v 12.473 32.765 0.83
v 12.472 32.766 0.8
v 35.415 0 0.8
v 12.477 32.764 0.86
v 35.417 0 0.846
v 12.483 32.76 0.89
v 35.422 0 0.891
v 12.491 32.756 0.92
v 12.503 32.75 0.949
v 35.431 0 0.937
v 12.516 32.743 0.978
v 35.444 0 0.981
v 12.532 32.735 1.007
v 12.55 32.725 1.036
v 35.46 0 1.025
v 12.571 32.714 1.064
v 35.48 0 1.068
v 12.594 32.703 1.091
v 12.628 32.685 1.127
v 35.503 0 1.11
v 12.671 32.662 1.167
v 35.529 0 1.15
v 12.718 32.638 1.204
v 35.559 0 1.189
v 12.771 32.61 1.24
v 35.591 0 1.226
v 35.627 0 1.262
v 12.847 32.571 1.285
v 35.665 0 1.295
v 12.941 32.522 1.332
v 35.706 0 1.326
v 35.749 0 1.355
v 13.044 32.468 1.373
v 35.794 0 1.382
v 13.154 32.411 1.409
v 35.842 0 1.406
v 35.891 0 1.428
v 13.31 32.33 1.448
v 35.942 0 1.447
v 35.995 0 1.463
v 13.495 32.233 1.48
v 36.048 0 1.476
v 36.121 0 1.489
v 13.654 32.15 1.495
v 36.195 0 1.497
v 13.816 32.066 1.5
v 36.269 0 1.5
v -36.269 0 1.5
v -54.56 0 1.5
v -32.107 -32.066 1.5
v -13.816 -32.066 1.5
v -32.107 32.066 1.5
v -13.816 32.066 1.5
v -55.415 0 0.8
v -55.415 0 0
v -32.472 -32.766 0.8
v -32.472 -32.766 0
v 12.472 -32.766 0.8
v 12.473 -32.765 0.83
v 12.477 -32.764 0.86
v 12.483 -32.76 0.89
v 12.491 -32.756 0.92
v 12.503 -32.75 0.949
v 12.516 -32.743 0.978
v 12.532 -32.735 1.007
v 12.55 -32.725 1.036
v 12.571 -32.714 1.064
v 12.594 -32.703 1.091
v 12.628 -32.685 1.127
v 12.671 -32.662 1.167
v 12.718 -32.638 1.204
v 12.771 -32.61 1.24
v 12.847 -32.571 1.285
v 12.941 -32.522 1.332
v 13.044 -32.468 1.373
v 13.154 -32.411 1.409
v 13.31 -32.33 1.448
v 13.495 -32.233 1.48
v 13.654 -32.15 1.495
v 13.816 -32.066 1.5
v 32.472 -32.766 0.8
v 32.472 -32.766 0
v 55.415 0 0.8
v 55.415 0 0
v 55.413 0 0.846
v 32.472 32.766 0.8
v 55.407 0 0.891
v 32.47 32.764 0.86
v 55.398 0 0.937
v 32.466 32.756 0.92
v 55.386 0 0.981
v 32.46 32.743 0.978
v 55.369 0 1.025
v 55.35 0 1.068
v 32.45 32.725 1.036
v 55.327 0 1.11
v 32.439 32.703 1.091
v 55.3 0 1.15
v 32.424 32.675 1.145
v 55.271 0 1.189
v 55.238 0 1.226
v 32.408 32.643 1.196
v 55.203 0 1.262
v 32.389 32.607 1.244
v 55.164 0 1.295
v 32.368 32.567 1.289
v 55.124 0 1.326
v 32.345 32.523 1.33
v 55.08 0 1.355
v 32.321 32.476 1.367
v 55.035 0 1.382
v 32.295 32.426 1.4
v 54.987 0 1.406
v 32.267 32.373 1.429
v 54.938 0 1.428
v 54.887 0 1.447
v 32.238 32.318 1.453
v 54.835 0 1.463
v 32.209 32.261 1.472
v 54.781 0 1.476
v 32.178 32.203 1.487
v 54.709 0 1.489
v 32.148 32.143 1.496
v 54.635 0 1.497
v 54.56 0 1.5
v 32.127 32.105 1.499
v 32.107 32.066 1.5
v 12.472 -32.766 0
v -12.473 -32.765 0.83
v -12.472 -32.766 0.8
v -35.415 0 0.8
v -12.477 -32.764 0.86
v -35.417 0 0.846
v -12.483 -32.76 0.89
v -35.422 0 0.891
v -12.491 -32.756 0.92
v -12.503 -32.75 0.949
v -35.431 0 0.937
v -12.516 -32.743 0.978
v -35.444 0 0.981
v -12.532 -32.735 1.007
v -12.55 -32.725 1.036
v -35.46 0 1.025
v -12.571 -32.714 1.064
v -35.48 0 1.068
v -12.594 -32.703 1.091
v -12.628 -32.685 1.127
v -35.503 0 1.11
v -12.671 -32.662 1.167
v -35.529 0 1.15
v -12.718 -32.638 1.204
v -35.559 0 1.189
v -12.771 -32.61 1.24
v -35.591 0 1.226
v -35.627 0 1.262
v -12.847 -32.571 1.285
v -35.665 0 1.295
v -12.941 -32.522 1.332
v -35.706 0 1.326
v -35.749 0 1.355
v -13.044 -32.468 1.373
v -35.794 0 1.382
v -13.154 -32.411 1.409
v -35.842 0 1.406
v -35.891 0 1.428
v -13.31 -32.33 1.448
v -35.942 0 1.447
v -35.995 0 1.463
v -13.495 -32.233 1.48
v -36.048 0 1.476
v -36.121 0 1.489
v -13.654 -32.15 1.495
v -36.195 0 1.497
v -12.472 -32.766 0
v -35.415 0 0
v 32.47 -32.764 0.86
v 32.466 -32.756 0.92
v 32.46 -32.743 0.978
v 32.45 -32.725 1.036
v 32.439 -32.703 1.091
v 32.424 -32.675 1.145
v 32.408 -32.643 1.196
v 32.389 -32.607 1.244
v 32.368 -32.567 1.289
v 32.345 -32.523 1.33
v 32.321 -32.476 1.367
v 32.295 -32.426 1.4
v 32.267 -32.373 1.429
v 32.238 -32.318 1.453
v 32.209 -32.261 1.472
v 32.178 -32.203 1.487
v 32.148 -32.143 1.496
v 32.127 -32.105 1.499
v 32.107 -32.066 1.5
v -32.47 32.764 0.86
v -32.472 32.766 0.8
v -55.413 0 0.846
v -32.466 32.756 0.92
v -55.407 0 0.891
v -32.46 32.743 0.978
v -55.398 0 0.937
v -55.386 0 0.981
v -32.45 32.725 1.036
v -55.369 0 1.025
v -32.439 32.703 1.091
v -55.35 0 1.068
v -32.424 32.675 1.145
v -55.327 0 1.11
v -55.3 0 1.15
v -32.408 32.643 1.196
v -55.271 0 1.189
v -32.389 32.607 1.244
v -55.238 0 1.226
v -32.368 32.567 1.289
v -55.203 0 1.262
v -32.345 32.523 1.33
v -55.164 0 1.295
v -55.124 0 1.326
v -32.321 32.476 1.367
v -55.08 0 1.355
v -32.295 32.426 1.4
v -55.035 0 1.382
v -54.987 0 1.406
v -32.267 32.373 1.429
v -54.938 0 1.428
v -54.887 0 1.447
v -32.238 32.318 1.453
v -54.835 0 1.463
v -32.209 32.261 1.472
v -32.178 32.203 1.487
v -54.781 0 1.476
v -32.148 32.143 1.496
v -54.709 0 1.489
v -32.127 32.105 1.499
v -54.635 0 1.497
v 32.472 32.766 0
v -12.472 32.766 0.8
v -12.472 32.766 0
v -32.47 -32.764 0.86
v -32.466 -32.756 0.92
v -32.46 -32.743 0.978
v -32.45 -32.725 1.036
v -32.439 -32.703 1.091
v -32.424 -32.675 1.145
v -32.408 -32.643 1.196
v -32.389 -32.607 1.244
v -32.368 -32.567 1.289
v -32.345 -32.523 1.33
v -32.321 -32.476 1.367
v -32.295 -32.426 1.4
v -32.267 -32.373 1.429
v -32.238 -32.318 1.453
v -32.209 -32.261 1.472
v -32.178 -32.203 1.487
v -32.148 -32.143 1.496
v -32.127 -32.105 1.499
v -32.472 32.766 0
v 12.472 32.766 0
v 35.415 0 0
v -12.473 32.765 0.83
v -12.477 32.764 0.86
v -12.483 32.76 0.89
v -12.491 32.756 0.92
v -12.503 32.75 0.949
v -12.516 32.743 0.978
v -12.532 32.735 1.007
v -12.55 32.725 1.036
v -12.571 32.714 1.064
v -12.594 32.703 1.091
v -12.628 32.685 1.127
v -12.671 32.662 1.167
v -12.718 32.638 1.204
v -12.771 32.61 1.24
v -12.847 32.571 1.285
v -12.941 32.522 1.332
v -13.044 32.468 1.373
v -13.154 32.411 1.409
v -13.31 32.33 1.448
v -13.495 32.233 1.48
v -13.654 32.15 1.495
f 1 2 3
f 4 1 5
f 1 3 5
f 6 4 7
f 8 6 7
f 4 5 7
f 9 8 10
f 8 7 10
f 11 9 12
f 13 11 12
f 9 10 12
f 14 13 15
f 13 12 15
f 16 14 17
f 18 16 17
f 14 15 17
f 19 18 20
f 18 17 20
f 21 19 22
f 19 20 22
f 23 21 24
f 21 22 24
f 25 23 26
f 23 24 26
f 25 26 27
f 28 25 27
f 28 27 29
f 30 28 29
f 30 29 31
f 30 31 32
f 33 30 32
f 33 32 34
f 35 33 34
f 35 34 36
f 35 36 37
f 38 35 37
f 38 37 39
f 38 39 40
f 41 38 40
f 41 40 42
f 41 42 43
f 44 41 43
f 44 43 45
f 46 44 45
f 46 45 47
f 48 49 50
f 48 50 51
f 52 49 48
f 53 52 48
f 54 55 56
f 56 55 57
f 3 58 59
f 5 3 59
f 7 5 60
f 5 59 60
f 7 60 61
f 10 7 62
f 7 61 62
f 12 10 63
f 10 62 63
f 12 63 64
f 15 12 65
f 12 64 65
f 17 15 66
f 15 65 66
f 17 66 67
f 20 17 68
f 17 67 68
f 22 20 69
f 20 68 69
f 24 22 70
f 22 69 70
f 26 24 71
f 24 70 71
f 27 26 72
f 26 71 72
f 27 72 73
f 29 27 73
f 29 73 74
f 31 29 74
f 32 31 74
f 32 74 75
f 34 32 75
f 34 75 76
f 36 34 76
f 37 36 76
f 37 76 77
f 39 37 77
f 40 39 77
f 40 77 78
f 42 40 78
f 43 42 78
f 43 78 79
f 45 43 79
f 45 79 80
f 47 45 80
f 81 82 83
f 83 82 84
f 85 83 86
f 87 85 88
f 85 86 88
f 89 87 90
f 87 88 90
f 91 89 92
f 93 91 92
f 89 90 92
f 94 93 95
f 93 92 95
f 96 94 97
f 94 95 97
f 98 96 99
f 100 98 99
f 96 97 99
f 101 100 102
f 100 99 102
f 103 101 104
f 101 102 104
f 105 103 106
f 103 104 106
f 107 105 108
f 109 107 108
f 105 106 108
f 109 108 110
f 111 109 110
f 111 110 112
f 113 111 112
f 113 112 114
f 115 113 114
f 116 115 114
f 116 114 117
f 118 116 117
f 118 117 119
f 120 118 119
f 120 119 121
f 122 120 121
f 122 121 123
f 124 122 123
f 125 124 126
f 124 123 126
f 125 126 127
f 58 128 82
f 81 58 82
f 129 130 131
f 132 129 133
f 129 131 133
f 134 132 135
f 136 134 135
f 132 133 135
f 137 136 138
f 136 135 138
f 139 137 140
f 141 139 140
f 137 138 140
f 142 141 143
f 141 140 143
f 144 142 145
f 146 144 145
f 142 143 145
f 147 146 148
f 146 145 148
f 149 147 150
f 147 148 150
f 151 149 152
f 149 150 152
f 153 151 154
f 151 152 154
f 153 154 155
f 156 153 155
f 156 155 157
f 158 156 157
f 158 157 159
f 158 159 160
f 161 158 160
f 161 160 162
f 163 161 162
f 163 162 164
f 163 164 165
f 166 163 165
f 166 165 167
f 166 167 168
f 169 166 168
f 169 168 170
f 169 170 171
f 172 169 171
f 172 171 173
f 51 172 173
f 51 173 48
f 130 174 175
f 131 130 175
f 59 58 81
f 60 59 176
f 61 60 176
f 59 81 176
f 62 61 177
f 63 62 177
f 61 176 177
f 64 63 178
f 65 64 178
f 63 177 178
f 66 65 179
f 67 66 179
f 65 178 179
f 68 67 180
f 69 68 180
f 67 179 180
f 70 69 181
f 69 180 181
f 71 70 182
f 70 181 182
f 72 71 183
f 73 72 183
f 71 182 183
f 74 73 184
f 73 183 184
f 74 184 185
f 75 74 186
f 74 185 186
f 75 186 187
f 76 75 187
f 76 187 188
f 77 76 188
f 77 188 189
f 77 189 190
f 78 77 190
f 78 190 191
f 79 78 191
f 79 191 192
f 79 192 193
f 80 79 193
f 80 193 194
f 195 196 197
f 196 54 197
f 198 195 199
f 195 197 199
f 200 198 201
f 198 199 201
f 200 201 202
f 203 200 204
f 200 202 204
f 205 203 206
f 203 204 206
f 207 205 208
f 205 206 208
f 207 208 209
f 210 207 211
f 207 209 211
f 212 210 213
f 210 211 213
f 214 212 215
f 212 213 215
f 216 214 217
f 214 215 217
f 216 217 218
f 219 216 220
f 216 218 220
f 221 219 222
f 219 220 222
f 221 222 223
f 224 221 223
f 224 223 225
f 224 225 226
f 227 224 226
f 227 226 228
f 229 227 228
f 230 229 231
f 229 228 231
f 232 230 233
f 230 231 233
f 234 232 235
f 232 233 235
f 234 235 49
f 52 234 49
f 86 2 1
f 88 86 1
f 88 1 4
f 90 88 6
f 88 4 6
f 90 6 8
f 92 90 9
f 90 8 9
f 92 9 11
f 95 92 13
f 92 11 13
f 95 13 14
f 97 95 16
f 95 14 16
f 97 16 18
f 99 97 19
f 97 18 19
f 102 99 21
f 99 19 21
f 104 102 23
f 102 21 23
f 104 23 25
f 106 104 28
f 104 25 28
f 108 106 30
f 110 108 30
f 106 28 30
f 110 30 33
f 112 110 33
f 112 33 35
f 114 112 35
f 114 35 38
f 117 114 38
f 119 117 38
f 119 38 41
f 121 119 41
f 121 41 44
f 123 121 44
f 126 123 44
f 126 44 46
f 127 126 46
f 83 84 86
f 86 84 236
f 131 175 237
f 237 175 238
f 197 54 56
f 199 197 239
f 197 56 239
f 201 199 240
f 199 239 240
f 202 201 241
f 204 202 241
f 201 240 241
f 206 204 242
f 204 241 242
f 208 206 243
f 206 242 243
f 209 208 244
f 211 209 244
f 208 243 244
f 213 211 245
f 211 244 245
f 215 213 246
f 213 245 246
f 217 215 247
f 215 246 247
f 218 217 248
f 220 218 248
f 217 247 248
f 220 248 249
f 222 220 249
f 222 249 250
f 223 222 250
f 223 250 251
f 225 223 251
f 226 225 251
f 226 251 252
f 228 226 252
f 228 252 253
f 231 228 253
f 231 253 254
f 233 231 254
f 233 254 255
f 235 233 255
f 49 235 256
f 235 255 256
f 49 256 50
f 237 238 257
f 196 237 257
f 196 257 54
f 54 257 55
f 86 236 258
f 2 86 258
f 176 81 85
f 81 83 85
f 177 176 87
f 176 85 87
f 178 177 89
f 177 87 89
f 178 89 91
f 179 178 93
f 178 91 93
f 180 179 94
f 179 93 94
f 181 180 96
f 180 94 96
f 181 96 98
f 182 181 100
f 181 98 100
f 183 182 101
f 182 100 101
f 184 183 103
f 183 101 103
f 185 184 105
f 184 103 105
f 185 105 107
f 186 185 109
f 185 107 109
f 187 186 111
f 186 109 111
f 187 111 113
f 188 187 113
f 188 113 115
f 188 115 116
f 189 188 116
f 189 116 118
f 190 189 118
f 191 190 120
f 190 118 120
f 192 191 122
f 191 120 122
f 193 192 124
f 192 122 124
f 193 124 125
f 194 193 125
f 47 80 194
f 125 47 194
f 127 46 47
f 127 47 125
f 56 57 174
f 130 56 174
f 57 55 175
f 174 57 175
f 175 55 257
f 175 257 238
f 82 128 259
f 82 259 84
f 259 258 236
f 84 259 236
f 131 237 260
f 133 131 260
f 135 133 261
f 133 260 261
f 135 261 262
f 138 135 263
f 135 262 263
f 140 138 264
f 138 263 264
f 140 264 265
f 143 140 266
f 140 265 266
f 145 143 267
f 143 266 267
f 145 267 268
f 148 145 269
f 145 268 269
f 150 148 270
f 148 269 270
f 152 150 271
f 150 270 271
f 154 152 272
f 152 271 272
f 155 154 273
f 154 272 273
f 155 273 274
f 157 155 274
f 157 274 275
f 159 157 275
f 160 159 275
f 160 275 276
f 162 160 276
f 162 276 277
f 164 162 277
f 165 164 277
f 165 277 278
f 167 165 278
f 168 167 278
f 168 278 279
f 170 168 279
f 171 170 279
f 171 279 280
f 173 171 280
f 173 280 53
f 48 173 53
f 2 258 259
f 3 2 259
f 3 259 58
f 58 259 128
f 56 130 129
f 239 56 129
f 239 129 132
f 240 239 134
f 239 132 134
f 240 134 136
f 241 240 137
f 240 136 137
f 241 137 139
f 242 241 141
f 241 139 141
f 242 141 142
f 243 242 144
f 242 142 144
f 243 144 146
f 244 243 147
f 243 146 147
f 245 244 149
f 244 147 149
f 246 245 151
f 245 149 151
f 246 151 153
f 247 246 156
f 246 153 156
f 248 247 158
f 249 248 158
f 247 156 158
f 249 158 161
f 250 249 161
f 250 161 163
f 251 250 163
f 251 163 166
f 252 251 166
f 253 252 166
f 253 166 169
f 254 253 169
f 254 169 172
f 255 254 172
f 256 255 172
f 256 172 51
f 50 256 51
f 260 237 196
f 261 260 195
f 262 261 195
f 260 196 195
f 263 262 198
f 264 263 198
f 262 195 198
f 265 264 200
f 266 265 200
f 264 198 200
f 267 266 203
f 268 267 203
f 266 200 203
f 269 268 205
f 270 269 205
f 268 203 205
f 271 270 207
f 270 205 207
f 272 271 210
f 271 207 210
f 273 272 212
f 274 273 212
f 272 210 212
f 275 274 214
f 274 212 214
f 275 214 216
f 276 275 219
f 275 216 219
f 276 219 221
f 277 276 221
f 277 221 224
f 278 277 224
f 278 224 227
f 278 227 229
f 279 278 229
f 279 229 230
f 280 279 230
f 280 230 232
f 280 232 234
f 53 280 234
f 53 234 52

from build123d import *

# Parameters (mm, degrees)
F1_DEPTH = 1.5
F2_R     = 0.7


with BuildPart() as f1:
    # F0 (on Top) → F1 (new body)
    with BuildSketch(Plane.XY):
        Polygon((-32.471634, 32.766082), (-55.414691, 0), (-32.471634, -32.766082), (-12.471634, -32.766082), (-35.414691, 0), (-12.471634, 32.766082), align=None)
        Polygon((32.471634, 32.766082), (12.471634, 32.766082), (35.414691, 0), (12.471634, -32.766082), (32.471634, -32.766082), (55.414691, 0), align=None)
    extrude(amount=F1_DEPTH)

    # F2
    f2_edges = [f1.edges().sort_by_distance(p)[0] for p in [
        (-22.471634, 32.766082, 1.5),
        (-43.943162, 16.383041, 1.5),
        (-43.943162, -16.383041, 1.5),
        (-22.471634, -32.766082, 1.5),
        (-23.943162, -16.383041, 1.5),
        (-23.943162, 16.383041, 1.5),
        (22.471634, -32.766082, 1.5),
        (43.943162, -16.383041, 1.5),
        (43.943162, 16.383041, 1.5),
        (22.471634, 32.766082, 1.5),
        (23.943162, 16.383041, 1.5),
        (23.943162, -16.383041, 1.5),
    ]]
    fillet(f2_edges, radius=F2_R)


solid = f1.part
